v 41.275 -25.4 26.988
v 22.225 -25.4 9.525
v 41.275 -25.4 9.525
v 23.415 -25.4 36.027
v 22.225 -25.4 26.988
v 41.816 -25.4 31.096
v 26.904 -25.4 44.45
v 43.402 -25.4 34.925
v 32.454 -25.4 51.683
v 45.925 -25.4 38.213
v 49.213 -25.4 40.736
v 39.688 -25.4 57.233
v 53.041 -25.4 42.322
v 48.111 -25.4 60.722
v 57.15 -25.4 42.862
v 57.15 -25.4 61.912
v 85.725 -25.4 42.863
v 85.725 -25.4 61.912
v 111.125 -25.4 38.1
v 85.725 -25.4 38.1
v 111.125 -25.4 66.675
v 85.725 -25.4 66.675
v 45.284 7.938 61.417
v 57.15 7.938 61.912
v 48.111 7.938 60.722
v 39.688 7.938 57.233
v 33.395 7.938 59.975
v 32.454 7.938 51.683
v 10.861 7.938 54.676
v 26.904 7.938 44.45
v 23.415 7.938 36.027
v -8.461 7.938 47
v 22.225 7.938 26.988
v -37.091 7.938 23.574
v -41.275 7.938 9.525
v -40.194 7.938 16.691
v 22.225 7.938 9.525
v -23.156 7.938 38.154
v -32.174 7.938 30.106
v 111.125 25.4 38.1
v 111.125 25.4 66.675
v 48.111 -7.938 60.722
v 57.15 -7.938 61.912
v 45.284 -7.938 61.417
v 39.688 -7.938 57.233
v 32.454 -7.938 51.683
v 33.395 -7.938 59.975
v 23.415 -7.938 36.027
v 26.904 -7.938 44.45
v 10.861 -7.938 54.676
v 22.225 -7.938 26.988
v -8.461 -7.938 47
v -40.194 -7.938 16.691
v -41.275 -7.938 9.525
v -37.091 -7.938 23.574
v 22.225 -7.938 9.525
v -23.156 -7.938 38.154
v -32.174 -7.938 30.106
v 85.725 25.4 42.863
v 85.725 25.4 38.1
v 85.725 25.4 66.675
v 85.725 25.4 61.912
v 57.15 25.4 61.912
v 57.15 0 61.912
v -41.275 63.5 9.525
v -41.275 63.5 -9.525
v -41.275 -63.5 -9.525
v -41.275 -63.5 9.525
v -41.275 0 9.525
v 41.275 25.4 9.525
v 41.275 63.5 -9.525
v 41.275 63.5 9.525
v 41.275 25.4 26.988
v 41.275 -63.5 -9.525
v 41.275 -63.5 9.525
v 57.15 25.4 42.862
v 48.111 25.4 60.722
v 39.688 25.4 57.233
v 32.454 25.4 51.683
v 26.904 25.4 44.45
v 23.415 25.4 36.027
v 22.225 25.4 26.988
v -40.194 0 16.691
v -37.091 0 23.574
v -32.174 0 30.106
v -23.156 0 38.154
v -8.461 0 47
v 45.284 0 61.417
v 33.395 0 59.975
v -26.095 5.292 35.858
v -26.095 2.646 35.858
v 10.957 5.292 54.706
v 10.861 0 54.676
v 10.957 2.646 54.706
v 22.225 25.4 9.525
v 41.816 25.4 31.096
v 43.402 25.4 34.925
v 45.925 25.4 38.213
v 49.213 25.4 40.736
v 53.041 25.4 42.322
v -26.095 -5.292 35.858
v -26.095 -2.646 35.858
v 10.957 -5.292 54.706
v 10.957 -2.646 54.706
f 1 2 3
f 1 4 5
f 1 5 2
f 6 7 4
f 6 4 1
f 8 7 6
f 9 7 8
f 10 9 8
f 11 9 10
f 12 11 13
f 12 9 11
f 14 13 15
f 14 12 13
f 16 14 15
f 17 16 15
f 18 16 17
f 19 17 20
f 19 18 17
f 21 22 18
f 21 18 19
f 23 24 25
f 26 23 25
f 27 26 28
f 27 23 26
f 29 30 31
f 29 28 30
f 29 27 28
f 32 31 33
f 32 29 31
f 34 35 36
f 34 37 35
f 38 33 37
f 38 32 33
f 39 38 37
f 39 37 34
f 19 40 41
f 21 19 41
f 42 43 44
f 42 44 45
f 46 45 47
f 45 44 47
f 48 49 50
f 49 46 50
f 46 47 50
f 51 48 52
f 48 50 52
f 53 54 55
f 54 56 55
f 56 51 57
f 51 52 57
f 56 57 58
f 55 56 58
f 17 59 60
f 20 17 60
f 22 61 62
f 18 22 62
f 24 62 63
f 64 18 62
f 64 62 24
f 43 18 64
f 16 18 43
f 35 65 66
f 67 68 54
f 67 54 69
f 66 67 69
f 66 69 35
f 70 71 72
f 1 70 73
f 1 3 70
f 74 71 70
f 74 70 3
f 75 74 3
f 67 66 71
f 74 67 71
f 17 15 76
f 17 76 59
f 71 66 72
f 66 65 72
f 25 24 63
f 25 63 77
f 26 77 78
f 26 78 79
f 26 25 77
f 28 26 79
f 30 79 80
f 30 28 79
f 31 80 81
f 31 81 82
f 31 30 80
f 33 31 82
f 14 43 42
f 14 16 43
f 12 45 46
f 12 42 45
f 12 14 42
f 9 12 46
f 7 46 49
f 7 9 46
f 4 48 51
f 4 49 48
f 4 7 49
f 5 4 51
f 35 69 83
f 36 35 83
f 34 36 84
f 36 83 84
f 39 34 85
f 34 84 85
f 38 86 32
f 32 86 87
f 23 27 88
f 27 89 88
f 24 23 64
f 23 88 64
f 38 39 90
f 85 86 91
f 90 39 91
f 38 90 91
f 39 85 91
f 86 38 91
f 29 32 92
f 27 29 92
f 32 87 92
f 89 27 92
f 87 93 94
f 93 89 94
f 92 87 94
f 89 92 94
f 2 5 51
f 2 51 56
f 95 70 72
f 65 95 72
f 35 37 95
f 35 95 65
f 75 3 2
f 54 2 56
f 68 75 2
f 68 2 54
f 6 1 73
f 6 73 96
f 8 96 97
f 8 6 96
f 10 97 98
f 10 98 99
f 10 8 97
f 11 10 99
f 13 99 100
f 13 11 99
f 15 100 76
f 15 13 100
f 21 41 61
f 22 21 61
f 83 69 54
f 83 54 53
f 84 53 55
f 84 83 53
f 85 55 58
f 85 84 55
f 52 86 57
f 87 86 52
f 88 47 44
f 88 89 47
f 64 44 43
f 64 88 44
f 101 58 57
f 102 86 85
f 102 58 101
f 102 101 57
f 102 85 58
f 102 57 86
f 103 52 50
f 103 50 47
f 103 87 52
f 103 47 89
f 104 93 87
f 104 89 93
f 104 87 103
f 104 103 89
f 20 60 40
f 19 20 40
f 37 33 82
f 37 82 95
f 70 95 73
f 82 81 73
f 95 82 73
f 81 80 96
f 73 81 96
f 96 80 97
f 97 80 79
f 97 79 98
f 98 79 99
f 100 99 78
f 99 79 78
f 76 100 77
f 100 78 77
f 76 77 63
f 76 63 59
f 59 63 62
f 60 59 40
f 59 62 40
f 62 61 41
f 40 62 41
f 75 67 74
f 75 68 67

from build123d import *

# Parameters (mm, degrees)
F1_DEPTH = 63.5
F0_W     = 25.4
F0_H     = 19.05
F2_DEPTH = 25.4
F3_DEPTH = 7.9375


with BuildPart() as f1:
    # F0 (on Front) → F1 (new body, symmetric)
    with BuildSketch(Plane.XZ):
        Polygon((-41.275, -9.525), (41.275, -9.525), (41.275, 9.525), (22.225, 9.525), (-41.275, 9.525), align=None)
    extrude(amount=F1_DEPTH, both=True)

    # F0 (on Front) → F2 (join, symmetric)
    with BuildSketch(Plane.XZ):
        with BuildLine():
            Line((22.225, 9.525), (41.275, 9.525))
            Line((41.275, 9.525), (41.275, 26.9875))
            ThreePointArc((41.275, 26.9875), (45.9246798487, 38.2128201513), (57.15, 42.8625))
            Line((57.15, 42.8625), (60.325, 42.8625))
            Line((60.325, 42.8625), (60.325, 61.9125))
            Line((60.325, 61.9125), (57.15, 61.9125))
            ThreePointArc((57.15, 61.9125), (32.4542956671, 51.6832043329), (22.225, 26.9875))
            Line((22.225, 26.9875), (22.225, 9.525))
        make_face()
        with Locations((73.025, 52.3875)):
            Rectangle(F0_W, F0_H)
        Polygon((85.725, 66.675), (85.725, 61.9125), (85.725, 42.8625), (85.725, 38.1), (111.125, 38.1), (111.125, 66.675), align=None)
    extrude(amount=F2_DEPTH, both=True)

    # F0 (on Front) → F3 (join, symmetric)
    with BuildSketch(Plane.XZ):
        with BuildLine():
            add(Edge.make_bspline(
                [(-41.275, 9.525), (-41.275, 38.2137889473), (10.6306826578, 61.9125), (57.15, 61.9125)],
                knots=[0, 0, 0, 0, 111.4985685166, 111.4985685166, 111.4985685166, 111.4985685166], degree=3))
            Line((-41.275, 9.525), (22.225, 9.525))
            Line((22.225, 9.525), (22.225, 26.9875))
            ThreePointArc((22.225, 26.9875), (32.4542956671, 51.6832043329), (57.15, 61.9125))
        make_face()
    extrude(amount=F3_DEPTH, both=True)


solid = f1.part
